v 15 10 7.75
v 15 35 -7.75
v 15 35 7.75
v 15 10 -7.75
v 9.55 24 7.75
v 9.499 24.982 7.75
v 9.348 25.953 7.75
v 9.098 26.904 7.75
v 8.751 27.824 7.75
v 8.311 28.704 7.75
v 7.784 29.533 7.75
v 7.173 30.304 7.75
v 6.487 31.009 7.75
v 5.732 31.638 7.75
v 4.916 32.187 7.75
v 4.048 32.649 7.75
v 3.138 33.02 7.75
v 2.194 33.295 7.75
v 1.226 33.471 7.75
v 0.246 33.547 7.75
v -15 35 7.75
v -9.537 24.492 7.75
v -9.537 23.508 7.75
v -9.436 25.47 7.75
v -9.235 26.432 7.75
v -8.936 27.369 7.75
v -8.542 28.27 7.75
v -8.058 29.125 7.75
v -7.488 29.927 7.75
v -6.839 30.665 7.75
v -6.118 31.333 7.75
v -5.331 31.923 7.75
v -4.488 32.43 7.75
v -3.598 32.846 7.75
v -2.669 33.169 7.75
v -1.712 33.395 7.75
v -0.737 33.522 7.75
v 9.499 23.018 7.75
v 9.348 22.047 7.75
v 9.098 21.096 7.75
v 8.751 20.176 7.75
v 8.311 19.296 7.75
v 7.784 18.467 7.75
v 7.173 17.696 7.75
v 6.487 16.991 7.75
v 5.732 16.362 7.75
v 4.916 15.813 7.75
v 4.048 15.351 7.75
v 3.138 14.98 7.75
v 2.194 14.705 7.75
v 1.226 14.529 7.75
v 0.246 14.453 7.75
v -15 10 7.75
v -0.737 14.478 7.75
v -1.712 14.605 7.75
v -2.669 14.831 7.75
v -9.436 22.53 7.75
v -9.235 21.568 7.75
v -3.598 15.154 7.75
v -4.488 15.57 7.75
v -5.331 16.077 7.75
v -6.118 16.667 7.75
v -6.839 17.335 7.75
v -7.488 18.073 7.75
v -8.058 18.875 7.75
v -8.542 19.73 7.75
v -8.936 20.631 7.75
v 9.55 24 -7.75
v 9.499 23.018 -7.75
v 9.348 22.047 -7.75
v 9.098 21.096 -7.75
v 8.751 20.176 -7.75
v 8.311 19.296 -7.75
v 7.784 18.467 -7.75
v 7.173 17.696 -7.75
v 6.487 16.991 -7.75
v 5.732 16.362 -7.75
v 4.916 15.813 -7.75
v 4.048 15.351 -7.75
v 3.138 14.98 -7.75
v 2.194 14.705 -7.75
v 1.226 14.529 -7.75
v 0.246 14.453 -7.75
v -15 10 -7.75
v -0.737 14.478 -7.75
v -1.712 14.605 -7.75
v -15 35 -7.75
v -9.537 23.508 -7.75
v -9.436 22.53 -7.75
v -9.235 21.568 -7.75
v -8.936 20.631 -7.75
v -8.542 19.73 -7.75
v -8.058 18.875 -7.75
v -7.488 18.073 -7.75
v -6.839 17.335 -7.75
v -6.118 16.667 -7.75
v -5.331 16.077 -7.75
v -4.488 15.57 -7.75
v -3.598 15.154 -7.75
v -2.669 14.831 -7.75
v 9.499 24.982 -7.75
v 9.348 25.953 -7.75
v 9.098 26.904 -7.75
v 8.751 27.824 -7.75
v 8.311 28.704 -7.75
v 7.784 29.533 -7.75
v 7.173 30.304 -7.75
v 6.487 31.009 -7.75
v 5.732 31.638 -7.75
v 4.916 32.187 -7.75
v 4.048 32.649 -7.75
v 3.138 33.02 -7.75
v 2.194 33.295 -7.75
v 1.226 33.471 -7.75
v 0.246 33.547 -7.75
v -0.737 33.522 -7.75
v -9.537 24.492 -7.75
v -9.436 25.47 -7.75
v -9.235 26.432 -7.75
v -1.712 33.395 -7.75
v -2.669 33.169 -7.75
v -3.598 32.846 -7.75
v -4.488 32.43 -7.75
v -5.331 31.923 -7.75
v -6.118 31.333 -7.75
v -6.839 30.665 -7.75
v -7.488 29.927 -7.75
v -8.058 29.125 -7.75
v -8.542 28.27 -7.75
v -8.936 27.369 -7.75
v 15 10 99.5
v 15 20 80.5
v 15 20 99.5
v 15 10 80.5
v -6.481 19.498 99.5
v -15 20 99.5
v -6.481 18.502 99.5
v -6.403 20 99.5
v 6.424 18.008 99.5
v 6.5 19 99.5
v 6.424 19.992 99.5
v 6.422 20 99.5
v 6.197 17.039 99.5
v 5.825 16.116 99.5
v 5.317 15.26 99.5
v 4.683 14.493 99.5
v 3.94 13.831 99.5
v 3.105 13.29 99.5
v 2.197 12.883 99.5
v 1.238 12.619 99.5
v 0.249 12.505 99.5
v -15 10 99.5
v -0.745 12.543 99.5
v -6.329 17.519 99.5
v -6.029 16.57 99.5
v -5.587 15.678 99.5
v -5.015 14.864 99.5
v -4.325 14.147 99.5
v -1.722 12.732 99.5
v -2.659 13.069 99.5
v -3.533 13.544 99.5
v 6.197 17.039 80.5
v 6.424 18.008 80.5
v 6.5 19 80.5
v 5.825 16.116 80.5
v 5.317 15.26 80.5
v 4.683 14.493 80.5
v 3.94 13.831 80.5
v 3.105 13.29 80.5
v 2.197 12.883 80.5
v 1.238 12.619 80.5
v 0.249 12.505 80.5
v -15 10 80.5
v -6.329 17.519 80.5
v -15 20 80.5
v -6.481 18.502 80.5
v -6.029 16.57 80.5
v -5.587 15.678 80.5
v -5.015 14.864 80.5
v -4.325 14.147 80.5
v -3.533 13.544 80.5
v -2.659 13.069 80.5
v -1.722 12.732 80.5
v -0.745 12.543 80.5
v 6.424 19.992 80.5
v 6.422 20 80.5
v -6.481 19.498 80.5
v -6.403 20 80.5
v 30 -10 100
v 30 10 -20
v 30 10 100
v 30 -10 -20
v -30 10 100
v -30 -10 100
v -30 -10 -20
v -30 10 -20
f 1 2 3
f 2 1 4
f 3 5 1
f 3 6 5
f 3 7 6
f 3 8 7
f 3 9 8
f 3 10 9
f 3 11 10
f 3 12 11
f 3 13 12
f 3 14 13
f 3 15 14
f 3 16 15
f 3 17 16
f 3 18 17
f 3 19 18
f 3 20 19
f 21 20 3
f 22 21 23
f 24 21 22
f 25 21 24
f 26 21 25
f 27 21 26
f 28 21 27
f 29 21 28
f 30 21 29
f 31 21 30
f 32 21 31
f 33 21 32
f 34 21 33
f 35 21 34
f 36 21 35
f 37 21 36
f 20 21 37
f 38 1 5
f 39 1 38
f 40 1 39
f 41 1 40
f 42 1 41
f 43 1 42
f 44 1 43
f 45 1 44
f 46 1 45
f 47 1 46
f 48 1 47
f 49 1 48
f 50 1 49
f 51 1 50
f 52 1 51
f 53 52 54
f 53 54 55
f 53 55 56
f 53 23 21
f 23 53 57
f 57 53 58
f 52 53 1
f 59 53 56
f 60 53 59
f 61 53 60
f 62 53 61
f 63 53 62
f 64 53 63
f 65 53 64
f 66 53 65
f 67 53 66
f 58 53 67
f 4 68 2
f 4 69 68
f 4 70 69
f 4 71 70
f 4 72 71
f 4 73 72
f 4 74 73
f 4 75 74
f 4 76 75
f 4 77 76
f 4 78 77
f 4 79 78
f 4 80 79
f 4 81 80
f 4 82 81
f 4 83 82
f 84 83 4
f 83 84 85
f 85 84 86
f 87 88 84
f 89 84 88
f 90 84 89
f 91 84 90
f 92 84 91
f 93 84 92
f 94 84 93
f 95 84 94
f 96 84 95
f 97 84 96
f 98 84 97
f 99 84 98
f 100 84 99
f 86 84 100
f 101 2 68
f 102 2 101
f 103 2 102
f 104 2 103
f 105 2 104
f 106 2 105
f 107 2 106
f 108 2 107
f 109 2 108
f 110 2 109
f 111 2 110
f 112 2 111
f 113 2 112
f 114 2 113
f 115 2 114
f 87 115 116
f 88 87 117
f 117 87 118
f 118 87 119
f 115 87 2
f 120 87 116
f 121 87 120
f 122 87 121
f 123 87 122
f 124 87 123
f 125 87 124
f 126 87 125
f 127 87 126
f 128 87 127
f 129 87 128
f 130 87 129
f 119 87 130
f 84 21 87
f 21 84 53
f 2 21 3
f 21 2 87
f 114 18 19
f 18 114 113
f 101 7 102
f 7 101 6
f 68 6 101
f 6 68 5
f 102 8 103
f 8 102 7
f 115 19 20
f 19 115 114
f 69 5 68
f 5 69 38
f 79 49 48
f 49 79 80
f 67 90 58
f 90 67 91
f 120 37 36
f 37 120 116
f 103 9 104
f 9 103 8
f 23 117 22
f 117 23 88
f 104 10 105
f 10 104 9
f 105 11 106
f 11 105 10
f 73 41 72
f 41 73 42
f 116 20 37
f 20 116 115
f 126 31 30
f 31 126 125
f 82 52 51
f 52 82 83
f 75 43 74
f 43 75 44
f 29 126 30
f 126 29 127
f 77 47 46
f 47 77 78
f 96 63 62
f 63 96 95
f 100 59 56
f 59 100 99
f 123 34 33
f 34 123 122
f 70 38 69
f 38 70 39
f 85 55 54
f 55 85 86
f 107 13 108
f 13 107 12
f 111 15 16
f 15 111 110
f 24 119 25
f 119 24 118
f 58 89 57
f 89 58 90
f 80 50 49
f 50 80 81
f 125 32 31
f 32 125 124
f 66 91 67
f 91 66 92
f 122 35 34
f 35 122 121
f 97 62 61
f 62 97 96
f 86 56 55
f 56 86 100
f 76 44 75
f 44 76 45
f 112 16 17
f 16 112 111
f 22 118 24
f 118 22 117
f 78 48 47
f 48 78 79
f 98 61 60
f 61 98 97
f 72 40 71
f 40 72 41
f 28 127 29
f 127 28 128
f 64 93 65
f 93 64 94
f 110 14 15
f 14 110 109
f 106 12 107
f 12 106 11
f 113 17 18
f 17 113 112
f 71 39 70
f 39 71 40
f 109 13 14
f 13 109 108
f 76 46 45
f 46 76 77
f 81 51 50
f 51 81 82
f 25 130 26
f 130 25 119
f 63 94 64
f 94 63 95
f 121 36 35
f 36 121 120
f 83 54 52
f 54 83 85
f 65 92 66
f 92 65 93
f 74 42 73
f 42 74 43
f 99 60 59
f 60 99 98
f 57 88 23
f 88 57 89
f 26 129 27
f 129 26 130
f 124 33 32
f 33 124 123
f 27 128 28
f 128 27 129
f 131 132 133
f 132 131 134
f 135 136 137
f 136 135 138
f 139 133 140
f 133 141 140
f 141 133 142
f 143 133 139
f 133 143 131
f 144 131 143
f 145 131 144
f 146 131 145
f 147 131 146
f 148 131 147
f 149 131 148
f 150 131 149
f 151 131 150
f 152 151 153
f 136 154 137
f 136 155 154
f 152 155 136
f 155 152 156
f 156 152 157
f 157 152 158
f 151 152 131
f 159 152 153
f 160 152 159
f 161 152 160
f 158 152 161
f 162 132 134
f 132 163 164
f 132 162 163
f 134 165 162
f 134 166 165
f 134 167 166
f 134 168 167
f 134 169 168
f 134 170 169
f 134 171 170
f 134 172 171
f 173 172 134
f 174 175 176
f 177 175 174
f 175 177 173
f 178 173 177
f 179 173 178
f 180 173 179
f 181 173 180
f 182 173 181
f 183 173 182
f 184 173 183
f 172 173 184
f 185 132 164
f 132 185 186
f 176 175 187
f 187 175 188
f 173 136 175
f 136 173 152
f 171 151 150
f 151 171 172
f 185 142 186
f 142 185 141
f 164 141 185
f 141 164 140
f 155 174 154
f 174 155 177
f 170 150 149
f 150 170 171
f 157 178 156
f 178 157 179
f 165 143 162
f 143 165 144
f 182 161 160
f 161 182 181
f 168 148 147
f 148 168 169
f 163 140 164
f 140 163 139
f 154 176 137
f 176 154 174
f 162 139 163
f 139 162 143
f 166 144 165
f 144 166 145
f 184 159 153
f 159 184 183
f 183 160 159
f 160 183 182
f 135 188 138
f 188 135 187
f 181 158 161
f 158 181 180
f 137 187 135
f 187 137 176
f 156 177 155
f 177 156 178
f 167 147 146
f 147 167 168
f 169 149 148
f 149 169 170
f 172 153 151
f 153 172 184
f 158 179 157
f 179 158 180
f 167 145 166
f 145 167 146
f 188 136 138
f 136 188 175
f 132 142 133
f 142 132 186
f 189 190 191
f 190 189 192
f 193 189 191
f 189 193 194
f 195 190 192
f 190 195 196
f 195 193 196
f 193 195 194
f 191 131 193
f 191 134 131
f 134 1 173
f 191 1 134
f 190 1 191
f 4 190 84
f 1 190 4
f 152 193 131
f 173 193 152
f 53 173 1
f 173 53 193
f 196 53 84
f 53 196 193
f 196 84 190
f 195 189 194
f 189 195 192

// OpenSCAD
// all measurements are in millimeters



union()
{
translate([0,0,40])
cube([60,20,120],true);

    difference()
    {    
    translate([0,20,0])    
    cube([30,30,15.5 ],true);
    translate([0,24,-40])
    cylinder(d = 19.1, h = 100, $fs = 1,$fa  = 1);    
    }
    
    difference()
    {    
    translate([0,20,90])    
    cube([30,30,19],true);
    translate([0,19,80])
    cylinder(d = 13, h = 500, $fs = 1,$fa  = 1); 
    translate([0,35,90])    
    cube([30,30,19],true);   
        
    }
    
 
}
